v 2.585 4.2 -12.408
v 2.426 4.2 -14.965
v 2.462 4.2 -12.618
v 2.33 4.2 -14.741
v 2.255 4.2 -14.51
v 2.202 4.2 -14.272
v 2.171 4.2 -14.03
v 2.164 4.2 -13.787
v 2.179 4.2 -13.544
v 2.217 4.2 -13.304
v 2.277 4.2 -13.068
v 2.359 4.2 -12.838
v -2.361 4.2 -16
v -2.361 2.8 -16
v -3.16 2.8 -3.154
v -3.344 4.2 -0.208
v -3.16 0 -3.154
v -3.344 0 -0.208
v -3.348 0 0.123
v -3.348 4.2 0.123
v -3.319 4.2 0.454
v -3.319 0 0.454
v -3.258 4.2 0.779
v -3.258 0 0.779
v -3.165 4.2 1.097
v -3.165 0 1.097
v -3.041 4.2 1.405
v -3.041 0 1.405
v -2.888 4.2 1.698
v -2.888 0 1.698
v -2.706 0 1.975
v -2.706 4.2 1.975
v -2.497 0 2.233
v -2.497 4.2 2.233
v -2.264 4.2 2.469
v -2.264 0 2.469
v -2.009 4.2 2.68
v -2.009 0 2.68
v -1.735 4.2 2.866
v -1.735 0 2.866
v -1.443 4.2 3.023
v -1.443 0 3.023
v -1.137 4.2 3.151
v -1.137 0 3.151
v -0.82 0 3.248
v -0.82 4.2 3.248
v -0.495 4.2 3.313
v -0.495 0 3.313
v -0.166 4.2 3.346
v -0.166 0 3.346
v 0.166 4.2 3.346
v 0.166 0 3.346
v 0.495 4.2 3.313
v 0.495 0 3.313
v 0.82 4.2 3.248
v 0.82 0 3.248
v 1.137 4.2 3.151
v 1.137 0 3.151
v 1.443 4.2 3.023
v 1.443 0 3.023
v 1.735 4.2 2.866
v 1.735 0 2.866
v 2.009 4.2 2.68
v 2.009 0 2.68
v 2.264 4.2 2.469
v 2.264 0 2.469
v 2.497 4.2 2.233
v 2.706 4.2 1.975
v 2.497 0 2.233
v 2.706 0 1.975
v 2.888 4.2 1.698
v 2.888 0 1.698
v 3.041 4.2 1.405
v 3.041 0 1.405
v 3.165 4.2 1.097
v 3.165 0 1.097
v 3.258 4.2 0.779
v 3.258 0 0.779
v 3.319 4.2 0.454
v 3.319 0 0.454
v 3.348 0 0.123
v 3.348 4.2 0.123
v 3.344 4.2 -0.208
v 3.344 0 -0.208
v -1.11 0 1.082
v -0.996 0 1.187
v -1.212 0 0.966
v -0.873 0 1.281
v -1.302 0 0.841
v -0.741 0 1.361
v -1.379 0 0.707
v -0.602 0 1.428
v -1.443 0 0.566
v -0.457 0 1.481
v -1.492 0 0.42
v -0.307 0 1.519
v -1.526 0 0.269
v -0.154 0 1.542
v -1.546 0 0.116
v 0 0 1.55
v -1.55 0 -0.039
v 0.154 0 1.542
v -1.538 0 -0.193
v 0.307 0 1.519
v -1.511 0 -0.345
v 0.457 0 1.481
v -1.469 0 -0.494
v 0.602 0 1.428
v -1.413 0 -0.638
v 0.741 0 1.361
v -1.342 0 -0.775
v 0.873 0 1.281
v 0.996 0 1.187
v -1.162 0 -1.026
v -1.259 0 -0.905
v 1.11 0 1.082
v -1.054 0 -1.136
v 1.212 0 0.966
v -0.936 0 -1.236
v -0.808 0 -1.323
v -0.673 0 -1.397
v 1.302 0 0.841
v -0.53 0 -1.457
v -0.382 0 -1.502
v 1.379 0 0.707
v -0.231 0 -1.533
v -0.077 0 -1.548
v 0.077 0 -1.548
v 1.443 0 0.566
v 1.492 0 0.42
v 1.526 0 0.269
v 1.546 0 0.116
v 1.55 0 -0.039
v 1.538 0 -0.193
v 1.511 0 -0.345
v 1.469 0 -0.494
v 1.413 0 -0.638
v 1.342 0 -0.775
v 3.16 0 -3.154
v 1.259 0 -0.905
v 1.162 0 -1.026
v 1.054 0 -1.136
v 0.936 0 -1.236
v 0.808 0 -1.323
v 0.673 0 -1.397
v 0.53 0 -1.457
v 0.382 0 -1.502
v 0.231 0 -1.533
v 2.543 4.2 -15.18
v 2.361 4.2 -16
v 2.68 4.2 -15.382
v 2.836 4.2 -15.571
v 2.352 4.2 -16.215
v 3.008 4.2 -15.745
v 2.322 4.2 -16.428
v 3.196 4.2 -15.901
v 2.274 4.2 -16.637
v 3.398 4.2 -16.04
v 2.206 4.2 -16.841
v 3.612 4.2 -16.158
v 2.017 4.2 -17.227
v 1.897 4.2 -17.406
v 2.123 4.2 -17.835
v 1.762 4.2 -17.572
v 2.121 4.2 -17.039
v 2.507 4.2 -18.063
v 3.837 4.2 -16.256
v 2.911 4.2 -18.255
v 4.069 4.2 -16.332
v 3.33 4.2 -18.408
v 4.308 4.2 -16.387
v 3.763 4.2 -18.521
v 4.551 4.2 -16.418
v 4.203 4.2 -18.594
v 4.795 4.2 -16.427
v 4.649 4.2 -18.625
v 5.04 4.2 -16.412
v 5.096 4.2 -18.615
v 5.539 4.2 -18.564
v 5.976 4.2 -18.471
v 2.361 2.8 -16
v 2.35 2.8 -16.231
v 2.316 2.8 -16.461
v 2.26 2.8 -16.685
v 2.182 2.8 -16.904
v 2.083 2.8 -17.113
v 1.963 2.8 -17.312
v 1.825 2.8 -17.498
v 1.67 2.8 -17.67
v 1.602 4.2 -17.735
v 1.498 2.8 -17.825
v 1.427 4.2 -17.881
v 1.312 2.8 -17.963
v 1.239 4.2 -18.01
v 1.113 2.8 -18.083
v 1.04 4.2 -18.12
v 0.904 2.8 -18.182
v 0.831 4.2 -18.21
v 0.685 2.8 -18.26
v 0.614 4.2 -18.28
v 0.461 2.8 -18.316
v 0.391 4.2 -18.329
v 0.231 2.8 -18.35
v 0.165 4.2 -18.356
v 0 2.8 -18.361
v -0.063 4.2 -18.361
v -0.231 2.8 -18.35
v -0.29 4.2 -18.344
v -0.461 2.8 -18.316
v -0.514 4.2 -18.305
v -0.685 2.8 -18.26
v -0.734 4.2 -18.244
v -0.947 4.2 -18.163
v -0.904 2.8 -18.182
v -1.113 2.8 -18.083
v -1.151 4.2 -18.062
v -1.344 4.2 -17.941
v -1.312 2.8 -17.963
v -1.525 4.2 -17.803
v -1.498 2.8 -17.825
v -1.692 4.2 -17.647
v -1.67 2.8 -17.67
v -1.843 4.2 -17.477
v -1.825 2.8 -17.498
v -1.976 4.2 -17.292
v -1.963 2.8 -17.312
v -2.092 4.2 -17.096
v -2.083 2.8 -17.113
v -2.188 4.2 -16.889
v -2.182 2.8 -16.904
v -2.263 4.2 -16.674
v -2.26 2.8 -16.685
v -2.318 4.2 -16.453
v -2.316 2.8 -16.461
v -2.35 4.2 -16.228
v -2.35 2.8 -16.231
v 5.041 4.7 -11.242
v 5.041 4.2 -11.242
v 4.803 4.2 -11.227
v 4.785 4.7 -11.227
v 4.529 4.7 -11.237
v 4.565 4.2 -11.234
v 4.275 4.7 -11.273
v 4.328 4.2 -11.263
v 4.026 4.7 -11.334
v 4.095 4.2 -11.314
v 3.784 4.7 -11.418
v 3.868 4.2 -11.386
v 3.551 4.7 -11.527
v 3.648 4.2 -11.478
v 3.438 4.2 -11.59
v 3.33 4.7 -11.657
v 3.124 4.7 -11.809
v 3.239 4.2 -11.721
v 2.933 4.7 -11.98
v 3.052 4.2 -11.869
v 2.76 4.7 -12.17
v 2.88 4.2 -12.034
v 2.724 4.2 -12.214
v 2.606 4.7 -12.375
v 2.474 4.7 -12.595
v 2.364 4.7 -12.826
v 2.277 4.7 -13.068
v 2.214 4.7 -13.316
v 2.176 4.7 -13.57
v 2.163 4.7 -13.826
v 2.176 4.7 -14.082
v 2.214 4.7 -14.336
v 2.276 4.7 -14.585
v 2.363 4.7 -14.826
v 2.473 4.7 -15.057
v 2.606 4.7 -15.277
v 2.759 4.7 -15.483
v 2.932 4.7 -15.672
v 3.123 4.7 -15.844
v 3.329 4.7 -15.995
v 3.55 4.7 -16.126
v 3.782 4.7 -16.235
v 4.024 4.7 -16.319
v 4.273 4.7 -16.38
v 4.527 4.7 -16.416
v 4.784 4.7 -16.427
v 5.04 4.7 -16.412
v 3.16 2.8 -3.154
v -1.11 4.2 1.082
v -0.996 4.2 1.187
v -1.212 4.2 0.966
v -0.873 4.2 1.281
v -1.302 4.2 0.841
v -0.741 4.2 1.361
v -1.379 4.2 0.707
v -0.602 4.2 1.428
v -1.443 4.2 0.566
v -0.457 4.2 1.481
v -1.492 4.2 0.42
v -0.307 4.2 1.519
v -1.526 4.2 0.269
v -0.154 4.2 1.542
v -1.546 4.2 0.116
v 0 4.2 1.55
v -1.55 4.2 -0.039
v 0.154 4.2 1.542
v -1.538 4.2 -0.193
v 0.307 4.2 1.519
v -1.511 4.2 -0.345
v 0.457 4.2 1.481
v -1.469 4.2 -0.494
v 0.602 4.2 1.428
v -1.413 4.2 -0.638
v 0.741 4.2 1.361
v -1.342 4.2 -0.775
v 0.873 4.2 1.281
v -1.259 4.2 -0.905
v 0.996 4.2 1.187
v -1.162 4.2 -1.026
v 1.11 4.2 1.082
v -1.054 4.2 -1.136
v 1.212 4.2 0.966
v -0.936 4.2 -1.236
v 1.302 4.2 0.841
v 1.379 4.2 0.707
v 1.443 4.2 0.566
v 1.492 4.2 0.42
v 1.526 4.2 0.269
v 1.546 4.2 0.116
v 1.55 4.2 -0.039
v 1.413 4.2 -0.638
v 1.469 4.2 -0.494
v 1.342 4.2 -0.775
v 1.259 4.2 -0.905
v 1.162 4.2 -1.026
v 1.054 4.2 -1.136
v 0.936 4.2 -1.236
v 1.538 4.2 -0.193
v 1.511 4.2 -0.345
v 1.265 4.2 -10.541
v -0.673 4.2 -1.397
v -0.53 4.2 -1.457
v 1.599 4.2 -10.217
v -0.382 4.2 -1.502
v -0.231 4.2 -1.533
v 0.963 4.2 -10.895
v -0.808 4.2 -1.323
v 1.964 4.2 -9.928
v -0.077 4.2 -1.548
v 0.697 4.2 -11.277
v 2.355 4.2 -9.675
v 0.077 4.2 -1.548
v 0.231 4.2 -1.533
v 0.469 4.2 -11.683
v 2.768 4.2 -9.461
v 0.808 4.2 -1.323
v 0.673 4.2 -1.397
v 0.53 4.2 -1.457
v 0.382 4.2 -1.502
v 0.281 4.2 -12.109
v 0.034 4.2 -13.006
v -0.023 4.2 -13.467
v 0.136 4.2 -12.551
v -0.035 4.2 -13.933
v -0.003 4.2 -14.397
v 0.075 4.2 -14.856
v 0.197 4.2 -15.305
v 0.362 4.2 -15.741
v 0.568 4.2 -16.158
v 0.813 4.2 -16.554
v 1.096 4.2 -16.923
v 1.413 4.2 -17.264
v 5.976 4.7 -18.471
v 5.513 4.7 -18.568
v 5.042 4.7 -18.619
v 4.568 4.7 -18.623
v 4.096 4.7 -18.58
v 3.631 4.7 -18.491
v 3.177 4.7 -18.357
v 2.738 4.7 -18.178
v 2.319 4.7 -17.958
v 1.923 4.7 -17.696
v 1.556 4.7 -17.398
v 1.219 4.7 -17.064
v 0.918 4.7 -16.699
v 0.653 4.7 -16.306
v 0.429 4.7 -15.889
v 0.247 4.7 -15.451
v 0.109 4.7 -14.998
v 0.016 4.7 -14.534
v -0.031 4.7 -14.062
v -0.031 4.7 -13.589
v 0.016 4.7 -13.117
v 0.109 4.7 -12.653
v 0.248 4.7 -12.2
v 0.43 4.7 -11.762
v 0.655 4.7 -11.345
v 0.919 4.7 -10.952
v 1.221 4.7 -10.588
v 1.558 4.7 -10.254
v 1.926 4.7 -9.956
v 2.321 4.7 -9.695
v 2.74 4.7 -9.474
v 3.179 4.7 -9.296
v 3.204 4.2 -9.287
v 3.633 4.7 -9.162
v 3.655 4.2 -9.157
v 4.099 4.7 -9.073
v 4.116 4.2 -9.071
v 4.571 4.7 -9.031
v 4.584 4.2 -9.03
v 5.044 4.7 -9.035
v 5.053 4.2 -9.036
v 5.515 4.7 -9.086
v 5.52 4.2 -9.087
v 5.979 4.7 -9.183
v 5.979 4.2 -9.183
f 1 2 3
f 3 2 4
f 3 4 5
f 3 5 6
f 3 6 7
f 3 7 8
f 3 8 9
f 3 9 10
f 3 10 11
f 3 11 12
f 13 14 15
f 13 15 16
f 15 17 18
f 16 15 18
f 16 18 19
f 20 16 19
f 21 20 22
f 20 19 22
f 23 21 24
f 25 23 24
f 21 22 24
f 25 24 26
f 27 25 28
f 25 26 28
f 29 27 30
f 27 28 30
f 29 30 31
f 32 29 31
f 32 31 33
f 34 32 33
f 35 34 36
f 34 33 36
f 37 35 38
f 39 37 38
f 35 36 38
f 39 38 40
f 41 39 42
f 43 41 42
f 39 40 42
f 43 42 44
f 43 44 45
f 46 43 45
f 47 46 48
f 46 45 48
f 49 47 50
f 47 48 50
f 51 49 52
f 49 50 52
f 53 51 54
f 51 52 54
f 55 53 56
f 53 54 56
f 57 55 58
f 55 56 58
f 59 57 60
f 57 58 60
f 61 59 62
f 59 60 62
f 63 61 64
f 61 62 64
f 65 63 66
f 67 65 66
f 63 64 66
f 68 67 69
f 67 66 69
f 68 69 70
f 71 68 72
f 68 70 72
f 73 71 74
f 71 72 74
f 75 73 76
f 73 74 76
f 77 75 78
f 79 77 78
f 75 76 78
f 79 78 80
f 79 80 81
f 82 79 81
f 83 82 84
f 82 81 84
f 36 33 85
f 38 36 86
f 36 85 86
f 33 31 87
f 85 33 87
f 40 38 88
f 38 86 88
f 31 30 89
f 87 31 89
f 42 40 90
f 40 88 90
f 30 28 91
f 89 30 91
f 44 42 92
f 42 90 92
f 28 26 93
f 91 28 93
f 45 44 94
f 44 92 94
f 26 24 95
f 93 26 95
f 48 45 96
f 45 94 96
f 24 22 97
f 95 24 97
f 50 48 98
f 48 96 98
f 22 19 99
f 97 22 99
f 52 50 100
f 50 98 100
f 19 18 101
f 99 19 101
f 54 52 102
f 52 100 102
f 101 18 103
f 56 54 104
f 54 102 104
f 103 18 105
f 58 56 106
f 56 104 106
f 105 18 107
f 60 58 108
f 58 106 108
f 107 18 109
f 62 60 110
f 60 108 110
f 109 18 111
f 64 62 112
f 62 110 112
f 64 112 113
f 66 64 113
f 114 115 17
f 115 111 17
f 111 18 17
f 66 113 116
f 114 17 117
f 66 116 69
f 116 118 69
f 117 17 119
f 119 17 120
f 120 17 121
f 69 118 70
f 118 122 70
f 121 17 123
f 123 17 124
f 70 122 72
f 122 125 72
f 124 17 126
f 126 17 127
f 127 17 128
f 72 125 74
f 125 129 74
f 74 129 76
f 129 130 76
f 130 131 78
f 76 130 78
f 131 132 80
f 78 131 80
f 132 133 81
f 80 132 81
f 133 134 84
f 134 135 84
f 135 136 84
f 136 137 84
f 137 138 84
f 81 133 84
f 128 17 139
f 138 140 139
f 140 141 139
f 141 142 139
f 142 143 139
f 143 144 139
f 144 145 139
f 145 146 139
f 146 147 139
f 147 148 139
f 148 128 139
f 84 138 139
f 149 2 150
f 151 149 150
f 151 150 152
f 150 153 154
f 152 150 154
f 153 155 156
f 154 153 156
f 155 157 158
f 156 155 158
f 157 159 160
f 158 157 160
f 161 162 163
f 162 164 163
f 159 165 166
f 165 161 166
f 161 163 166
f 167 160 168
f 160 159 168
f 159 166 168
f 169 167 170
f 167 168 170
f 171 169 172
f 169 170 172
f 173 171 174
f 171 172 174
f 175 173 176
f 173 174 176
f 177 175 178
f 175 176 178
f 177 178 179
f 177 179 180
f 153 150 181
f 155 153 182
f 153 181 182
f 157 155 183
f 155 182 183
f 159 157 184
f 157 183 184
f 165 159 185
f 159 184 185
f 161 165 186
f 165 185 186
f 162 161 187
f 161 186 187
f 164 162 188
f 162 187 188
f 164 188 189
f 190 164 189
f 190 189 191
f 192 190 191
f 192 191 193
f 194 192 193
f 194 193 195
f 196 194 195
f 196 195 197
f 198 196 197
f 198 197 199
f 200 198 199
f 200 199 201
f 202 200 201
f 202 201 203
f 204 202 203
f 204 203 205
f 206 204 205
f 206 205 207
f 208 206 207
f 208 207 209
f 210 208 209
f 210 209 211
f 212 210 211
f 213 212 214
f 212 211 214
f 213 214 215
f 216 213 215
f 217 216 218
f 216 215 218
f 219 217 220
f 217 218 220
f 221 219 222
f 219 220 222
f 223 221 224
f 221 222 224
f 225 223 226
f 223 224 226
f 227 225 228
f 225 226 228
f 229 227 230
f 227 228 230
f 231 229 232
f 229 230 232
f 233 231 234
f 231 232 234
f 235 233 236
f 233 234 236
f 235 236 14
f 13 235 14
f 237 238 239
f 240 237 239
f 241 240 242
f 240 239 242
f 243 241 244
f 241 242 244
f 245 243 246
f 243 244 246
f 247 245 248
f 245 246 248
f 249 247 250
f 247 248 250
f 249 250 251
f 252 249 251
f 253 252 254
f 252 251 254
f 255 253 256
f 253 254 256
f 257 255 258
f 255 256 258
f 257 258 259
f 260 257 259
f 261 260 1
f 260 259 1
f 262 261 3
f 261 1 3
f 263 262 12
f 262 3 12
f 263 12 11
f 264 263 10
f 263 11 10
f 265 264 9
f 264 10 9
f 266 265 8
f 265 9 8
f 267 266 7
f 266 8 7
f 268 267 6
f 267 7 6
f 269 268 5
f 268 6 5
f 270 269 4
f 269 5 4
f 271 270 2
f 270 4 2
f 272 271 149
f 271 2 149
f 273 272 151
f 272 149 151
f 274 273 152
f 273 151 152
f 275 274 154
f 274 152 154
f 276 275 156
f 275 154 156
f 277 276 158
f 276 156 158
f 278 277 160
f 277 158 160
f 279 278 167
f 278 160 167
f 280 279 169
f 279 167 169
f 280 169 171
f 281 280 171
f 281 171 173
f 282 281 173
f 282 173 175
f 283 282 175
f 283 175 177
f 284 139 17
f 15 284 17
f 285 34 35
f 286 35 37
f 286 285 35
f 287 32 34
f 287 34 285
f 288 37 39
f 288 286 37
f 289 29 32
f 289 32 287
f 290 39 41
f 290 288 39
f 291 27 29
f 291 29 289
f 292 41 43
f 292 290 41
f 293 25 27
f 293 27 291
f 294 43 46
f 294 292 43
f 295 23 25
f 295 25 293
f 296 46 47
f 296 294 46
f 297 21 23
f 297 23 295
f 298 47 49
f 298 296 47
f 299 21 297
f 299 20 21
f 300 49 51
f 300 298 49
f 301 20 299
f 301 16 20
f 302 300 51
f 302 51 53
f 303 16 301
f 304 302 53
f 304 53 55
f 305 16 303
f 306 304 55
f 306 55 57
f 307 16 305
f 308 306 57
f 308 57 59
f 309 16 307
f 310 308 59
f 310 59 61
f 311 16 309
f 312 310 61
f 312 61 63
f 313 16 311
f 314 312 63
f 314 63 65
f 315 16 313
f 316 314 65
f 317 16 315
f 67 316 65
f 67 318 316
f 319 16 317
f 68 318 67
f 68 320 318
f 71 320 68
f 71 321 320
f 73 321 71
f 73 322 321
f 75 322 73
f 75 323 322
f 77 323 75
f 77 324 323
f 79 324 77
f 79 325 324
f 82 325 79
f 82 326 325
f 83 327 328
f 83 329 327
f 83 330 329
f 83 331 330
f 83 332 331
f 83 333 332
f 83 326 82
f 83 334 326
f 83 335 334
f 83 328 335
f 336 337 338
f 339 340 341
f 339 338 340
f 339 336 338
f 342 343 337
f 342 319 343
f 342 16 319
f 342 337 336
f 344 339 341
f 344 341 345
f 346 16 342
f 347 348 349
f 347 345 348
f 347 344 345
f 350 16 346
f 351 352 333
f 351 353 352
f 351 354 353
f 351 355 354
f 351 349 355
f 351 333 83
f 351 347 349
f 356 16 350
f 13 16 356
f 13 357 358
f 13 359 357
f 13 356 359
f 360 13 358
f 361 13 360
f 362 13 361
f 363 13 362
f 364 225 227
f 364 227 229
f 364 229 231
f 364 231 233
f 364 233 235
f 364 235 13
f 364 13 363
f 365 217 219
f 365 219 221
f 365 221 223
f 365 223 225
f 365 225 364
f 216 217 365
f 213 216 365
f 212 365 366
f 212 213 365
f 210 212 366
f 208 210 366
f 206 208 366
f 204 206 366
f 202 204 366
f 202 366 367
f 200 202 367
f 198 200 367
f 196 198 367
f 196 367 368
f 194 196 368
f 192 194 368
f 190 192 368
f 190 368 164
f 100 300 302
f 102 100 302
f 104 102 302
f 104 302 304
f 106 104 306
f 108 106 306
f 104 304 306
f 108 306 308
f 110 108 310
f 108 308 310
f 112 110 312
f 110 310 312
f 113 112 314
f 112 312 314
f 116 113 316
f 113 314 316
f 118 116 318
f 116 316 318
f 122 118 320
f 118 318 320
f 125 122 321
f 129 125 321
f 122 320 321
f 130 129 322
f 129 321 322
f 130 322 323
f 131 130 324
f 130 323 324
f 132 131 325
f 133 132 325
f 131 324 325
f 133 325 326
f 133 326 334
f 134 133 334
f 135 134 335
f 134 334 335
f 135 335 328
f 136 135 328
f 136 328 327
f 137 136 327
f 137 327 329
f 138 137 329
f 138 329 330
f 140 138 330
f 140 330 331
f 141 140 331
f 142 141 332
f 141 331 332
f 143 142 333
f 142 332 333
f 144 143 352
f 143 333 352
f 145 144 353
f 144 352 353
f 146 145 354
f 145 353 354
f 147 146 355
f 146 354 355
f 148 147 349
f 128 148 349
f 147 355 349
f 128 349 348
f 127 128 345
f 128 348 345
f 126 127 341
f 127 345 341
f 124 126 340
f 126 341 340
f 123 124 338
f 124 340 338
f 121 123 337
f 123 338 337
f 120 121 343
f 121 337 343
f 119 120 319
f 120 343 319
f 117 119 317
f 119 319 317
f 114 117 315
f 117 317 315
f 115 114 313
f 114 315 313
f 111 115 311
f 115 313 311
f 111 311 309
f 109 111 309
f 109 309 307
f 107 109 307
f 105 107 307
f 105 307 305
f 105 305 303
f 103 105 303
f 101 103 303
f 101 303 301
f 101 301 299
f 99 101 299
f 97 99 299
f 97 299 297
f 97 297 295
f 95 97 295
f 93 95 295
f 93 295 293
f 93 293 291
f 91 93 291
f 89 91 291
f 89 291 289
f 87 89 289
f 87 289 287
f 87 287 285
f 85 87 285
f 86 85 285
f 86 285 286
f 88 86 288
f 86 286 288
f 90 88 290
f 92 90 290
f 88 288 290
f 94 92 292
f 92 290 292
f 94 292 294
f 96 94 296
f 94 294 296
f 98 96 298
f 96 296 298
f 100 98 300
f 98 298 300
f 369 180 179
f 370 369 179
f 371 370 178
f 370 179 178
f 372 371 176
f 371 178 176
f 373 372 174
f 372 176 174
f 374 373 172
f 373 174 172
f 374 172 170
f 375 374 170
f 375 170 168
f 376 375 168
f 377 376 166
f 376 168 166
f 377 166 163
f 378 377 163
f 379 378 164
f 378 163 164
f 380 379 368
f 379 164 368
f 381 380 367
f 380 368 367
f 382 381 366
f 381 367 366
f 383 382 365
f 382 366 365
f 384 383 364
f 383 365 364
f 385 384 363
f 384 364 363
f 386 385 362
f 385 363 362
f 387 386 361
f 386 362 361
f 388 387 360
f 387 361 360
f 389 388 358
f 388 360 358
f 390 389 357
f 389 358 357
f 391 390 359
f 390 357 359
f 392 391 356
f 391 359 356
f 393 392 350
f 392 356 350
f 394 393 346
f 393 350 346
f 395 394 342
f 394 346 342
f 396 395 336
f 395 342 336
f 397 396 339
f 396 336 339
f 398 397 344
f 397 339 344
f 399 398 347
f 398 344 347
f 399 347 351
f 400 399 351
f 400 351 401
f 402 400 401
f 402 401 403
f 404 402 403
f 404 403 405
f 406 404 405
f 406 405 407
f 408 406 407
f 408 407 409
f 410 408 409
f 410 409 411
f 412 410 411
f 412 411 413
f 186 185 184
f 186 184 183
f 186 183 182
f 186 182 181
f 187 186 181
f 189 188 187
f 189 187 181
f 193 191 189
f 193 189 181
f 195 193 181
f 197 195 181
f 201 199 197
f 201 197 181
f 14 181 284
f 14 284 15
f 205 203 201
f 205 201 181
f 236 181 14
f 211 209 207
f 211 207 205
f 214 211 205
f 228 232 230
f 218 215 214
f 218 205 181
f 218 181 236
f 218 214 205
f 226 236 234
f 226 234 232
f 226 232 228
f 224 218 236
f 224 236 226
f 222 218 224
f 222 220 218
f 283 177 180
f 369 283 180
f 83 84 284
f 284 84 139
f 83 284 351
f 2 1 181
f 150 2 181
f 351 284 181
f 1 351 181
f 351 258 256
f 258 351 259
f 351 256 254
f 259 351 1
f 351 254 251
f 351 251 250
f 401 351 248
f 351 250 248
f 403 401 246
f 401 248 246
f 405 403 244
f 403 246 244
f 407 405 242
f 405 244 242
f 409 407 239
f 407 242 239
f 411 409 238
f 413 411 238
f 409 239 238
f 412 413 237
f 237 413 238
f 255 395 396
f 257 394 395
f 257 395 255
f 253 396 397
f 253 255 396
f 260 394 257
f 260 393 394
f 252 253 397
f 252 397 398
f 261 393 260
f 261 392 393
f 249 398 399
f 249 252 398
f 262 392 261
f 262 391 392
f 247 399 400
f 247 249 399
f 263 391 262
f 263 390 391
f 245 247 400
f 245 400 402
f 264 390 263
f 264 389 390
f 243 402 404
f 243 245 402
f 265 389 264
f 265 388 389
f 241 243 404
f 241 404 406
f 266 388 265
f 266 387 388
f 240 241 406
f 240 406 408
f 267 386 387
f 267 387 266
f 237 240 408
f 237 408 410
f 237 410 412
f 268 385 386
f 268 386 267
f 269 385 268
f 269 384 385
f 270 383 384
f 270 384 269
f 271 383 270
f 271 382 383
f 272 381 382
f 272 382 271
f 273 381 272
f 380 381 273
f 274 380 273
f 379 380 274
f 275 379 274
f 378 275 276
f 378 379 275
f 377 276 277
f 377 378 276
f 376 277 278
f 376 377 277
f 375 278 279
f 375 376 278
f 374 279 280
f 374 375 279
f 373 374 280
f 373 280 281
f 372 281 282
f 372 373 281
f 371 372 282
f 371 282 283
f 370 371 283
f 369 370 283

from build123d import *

# Parameters (mm, degrees)
BOSS_EXTRUDE1_DEPTH = 4.2
SKETCH2_R           = 1.550030902
CUT_EXTRUDE1_DEPTH  = 4.2
WASHER_DEPTH        = 0.5
SKETCH4_W           = 15.014396114
SKETCH4_H           = 18.830226703
CUT_EXTRUDE2_DEPTH  = 2.8


with BuildPart() as part:
    # Sketch1 → Boss-Extrude1 (new body)
    with BuildSketch(Plane(origin=(0, 0, 0), x_dir=(1, 0, 0), z_dir=(0, 1, 0))):
        with BuildLine():
            Line((-2.361421162, 16), (-3.343540366, 0.207937064))
            ThreePointArc((-3.343540366, 0.207937064), (0, -3.35), (3.343540366, 0.207937064))
            Line((3.343540366, 0.207937064), (2.361421162, 16))
            ThreePointArc((2.361421162, 16), (0, 18.361421162), (-2.361421162, 16))
        make_face()
    extrude(amount=BOSS_EXTRUDE1_DEPTH)

    # Sketch2 → Cut-Extrude1 (cut)
    with BuildSketch(Plane(origin=(0, 4.2, 0), x_dir=(1, 0, 0), z_dir=(0, 1, 0))):
        with Locations(Location((0, 0, 0), (0, 0, 270))):
            Circle(SKETCH2_R)
    extrude(amount=-CUT_EXTRUDE1_DEPTH, mode=Mode.SUBTRACT)

    # Sketch3 → Washer (add)
    with BuildSketch(Plane(origin=(0, 4.2, 0), x_dir=(1, 0, 0), z_dir=(0, 1, 0))):
        with BuildLine():
            Line((5.978845304, 9.183192045), (5.040969257, 11.241624252))
            ThreePointArc((5.040969257, 11.241624252), (2.163457141, 13.826055508), (5.039545151, 16.412071489))
            Line((5.039545151, 16.412071489), (5.976287141, 18.471020026))
            ThreePointArc((5.976287141, 18.471020026), (-0.036542776, 13.825449558), (5.978845304, 9.183192045))
        make_face()
    extrude(amount=WASHER_DEPTH)

    # Sketch4 → Cut-Extrude2 (cut)
    with BuildSketch(Plane(origin=(0, 0, 0), x_dir=(-1, 0, 0), z_dir=(0, -1, 0))):
        with Locations((-0.264298209, 12.569563008)):
            Rectangle(SKETCH4_W, SKETCH4_H)
    extrude(amount=-CUT_EXTRUDE2_DEPTH, mode=Mode.SUBTRACT)


solid = part.part
